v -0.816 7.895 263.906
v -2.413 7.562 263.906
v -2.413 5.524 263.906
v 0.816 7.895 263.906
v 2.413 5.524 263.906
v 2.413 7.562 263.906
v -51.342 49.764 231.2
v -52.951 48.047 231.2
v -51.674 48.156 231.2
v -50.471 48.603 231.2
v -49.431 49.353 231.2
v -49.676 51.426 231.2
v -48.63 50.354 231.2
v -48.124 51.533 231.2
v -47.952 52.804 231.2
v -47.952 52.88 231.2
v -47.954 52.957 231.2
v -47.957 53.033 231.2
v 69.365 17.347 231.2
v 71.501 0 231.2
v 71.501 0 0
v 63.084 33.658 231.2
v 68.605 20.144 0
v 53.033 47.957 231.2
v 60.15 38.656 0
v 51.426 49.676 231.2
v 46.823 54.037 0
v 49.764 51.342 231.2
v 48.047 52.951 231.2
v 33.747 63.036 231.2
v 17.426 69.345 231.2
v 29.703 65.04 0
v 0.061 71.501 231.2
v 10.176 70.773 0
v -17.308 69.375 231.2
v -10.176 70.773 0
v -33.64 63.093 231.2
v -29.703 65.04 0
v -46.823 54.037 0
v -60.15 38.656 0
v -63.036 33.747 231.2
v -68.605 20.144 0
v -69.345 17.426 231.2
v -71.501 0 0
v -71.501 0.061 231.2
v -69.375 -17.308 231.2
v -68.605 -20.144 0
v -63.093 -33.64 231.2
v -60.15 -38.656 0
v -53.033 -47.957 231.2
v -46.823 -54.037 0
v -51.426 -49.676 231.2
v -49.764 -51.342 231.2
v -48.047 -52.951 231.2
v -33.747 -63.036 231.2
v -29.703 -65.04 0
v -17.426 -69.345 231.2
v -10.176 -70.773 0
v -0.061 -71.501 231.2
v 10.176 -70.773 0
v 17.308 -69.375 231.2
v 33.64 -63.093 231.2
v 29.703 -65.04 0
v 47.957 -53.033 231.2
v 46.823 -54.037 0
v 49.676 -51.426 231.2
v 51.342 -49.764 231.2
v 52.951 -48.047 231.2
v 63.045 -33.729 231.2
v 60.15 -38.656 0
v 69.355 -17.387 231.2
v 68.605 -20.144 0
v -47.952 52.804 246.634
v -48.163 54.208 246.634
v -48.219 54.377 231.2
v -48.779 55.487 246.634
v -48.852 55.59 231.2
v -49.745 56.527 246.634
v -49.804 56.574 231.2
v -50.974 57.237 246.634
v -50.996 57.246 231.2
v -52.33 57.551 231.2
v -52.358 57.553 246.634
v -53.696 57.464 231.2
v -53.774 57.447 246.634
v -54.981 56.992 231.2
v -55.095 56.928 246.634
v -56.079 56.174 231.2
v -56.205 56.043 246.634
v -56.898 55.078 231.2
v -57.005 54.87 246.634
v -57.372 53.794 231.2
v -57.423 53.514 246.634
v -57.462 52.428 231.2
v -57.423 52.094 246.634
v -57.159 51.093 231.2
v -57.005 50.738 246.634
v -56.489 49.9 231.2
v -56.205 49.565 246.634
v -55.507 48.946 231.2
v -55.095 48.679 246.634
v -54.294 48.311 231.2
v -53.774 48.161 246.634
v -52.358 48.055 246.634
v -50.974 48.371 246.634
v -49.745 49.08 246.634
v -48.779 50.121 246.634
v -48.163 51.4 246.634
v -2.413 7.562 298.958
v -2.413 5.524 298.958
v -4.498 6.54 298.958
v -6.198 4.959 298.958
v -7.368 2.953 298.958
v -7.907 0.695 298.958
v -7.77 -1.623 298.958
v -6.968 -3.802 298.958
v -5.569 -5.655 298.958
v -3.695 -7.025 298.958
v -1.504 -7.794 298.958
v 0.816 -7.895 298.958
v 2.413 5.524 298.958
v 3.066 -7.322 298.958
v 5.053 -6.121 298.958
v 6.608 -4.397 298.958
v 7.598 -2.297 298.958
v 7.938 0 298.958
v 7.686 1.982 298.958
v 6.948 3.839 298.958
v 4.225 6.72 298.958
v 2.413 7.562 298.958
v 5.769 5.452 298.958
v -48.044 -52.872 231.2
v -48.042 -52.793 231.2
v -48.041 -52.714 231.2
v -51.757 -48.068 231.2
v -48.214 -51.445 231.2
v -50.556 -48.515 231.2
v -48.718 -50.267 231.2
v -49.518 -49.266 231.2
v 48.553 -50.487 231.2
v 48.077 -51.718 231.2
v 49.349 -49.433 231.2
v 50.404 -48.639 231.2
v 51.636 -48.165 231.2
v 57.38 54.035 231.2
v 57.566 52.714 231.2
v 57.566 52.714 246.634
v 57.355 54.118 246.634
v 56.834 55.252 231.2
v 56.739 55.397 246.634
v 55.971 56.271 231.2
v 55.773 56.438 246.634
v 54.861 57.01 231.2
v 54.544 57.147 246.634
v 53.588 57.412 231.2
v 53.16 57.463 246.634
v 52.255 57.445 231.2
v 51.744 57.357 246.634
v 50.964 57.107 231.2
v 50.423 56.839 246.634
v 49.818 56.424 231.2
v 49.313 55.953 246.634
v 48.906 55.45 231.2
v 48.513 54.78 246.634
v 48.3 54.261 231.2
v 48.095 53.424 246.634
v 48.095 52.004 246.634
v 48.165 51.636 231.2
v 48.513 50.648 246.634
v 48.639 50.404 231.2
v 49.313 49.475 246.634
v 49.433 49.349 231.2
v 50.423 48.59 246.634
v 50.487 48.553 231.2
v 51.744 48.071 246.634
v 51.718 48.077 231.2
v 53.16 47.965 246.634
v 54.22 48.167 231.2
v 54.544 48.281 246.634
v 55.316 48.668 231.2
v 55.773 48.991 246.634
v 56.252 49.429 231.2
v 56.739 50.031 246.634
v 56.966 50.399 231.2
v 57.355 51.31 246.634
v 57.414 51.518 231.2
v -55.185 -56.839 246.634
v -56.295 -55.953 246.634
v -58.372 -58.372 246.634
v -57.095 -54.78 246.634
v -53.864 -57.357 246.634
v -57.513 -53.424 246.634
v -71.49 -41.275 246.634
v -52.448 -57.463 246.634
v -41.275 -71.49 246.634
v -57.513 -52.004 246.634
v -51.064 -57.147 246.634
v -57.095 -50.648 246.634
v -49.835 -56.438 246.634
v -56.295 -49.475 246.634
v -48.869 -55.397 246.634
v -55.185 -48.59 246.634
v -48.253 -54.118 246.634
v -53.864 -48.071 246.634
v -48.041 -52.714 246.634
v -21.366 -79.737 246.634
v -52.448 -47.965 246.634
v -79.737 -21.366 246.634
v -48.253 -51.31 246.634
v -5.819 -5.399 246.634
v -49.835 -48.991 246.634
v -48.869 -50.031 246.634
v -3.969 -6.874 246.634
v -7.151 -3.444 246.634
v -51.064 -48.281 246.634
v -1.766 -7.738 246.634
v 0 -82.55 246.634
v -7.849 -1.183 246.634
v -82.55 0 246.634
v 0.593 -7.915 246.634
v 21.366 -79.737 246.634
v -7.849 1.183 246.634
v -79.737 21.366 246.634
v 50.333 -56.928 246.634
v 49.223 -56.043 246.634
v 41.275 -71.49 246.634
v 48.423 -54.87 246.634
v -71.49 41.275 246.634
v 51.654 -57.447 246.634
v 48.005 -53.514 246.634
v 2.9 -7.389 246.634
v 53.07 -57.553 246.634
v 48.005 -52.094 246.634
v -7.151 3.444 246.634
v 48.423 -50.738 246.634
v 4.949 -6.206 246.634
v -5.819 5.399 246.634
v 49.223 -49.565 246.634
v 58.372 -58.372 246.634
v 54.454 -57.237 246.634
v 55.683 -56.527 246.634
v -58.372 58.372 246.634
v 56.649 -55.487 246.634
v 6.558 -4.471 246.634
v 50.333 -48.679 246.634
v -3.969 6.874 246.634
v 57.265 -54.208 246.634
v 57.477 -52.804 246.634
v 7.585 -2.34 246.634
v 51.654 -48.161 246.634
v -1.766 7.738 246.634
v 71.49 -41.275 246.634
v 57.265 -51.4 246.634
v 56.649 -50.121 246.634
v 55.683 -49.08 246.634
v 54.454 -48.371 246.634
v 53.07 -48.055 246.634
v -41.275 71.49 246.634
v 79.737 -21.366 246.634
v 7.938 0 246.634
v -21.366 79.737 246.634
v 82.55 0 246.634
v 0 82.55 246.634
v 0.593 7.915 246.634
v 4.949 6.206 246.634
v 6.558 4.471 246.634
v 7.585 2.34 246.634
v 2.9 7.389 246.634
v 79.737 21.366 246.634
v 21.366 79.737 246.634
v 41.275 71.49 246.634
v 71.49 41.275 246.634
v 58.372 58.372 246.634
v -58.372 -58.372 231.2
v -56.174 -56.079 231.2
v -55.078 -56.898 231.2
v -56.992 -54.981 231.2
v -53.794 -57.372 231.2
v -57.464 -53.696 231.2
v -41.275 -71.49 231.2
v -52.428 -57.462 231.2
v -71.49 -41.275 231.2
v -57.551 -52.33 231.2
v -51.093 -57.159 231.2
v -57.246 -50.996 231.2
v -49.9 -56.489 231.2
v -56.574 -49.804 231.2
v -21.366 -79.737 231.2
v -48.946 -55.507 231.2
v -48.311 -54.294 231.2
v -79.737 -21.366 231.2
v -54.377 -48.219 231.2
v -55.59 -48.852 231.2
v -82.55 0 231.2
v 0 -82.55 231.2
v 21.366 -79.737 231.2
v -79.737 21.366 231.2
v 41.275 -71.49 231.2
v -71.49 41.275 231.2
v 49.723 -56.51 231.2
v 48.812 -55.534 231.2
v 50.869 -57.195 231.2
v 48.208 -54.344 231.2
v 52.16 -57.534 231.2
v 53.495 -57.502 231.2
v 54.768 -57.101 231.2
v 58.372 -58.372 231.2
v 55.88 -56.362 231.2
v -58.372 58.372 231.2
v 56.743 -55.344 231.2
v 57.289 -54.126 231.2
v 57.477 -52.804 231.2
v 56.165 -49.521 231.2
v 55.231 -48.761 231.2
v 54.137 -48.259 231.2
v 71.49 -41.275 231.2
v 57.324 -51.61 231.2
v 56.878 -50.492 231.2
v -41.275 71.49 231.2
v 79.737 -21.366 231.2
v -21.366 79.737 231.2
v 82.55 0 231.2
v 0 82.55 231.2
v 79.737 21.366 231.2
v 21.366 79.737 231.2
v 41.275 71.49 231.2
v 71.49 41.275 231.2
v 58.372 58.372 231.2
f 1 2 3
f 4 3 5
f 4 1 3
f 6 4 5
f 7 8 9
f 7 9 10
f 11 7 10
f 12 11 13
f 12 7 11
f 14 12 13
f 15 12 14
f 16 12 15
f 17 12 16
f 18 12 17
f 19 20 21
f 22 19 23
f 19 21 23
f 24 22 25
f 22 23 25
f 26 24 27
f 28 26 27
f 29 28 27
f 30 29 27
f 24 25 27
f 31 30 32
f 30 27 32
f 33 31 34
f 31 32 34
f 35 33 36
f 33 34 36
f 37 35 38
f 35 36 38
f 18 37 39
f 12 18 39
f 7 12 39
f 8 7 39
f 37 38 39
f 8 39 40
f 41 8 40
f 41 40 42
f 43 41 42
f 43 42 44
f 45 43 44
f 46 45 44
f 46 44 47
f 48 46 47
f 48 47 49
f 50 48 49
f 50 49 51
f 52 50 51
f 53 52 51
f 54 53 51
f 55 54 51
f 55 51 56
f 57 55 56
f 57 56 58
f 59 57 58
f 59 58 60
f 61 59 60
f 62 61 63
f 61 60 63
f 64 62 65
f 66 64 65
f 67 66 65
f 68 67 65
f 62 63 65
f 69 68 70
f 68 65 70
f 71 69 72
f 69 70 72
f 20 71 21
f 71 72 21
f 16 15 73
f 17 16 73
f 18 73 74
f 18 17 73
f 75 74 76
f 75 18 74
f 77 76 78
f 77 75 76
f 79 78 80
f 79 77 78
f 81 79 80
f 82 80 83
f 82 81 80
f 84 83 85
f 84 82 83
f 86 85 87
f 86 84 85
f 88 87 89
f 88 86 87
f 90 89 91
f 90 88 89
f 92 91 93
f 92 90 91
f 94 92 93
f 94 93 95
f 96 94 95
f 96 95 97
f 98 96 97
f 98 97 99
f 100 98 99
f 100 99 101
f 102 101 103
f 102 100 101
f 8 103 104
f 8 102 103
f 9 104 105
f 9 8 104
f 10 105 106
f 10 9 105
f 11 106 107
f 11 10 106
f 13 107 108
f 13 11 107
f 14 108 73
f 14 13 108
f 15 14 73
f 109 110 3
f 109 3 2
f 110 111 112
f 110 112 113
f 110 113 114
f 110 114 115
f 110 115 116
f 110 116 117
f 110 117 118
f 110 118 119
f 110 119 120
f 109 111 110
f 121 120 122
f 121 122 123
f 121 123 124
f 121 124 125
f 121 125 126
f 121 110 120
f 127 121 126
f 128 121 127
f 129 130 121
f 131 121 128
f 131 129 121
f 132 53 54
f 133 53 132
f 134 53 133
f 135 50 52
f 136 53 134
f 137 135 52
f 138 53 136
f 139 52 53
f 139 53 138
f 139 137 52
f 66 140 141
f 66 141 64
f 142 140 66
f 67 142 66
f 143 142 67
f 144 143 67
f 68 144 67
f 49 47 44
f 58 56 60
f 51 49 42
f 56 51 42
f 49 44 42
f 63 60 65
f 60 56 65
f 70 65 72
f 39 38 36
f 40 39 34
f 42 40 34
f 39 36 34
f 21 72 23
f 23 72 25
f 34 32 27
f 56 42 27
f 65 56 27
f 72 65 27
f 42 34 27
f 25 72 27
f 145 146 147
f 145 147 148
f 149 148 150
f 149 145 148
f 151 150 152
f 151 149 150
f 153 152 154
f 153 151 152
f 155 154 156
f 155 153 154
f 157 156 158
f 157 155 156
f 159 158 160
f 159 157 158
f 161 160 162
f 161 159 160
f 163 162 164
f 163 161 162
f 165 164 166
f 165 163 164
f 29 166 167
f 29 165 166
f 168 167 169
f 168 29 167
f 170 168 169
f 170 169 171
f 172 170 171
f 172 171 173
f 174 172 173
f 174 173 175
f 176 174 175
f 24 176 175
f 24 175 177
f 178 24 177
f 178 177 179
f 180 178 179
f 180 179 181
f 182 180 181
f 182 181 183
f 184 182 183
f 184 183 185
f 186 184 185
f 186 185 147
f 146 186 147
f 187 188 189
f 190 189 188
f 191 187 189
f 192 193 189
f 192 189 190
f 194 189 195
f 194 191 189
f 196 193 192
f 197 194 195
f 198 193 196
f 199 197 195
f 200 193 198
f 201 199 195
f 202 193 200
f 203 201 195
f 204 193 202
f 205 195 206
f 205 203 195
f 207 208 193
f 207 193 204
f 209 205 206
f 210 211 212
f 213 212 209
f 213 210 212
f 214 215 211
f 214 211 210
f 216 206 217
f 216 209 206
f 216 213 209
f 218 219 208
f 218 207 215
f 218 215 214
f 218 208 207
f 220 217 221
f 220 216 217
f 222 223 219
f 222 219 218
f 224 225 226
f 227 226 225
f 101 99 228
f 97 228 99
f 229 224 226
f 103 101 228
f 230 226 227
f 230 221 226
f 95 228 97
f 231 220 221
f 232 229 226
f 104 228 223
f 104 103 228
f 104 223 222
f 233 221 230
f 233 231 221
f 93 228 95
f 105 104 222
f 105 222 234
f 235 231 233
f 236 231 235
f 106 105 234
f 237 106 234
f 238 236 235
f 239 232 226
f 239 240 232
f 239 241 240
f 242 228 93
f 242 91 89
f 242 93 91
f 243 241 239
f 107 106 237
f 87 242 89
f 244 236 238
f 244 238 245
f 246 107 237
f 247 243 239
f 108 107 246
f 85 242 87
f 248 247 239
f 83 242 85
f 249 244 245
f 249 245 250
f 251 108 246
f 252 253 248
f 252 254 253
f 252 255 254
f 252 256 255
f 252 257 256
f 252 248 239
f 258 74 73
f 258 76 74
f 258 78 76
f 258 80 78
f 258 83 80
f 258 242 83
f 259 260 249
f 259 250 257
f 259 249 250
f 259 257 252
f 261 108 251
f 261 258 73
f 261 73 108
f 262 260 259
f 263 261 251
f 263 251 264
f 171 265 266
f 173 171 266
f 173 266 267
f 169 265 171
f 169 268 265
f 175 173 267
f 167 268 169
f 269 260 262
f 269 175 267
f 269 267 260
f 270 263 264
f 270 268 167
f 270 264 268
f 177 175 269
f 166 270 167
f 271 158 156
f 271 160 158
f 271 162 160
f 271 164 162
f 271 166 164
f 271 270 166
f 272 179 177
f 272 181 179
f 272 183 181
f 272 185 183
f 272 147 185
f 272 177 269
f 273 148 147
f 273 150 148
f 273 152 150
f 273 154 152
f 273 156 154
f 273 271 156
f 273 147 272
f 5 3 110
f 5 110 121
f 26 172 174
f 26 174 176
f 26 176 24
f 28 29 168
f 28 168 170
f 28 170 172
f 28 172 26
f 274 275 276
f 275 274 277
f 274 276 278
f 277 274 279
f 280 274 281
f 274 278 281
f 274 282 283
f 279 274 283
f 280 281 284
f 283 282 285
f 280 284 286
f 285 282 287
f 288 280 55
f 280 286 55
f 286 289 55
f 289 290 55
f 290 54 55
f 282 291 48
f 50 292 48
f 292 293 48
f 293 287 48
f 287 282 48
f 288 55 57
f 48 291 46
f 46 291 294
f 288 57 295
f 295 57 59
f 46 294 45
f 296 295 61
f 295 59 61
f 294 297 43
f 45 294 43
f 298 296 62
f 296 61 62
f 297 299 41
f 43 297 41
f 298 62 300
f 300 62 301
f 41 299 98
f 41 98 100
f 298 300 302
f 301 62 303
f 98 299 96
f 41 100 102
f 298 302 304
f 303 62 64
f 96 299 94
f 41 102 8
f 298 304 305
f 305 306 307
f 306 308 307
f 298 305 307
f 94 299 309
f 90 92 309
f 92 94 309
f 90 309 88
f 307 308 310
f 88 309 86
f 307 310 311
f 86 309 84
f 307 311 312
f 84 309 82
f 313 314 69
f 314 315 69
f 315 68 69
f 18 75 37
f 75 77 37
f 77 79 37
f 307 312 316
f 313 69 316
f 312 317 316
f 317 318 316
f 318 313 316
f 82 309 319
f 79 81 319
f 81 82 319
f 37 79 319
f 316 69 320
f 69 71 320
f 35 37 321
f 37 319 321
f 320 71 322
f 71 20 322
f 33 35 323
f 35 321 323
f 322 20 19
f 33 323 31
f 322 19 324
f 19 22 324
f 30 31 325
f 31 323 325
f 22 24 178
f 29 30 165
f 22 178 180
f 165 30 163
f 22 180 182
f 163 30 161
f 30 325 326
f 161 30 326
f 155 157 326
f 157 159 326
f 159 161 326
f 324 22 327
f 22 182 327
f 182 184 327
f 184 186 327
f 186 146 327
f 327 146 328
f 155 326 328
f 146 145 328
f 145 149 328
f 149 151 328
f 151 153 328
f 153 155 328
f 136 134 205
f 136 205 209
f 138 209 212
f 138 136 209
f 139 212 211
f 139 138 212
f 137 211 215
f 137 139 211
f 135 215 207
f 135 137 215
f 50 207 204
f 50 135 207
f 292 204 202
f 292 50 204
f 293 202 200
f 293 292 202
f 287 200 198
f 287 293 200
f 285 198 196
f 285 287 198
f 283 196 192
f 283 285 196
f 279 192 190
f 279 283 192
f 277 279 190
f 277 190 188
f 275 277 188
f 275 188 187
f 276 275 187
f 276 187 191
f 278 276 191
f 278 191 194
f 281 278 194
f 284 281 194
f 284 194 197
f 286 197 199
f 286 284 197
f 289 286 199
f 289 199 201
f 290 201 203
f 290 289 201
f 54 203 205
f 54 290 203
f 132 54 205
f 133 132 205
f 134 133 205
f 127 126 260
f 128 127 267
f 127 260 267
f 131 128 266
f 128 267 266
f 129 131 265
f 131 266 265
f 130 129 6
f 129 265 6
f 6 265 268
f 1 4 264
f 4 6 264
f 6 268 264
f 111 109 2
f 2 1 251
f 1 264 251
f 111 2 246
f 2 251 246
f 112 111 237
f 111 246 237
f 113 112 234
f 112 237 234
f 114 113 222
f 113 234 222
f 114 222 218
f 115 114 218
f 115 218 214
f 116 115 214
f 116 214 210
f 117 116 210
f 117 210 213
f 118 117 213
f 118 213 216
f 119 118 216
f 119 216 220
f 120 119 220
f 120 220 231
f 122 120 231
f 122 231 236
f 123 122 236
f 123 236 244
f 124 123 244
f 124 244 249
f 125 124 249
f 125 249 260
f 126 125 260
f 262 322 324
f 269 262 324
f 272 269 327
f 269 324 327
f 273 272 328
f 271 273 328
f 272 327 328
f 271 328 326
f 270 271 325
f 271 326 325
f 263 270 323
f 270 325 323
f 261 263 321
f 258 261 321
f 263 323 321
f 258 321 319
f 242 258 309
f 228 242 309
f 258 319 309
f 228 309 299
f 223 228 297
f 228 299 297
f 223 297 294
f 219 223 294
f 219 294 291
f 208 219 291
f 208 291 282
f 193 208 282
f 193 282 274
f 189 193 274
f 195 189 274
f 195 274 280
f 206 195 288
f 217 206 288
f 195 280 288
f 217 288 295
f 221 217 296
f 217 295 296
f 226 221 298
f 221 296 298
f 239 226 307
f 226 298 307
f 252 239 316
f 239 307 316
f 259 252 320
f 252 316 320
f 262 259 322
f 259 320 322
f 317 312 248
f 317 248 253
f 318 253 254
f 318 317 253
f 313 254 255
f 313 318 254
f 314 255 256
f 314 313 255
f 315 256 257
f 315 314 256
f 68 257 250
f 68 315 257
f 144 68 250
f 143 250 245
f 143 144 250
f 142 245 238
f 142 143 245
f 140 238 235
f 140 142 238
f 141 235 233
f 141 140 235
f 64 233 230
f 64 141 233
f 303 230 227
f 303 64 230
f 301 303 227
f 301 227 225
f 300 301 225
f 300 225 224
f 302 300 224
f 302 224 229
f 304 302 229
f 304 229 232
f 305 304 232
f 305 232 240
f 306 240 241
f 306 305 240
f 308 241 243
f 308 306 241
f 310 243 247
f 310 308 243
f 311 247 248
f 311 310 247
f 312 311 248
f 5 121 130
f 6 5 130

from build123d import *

# Parameters (mm, degrees)
SKETCH2_R           = 71.501
BOSS_EXTRUDE1_DEPTH = 231.199972222
SKETCH3_R           = 82.55
SKETCH3_R_2         = 4.7625
BOSS_EXTRUDE2_DEPTH = 15.434027778
SKETCH4_R           = 7.9375
BOSS_EXTRUDE3_DEPTH = 52.324
SKETCH5_W           = 4.826
SKETCH5_H           = 4.826
CUT_EXTRUDE1_DEPTH  = 35.052


with BuildPart() as part:
    # Sketch2 → Boss-Extrude1 (new body)
    with BuildSketch(Plane.XY):
        Circle(SKETCH2_R)
    extrude(amount=BOSS_EXTRUDE1_DEPTH)

    # Sketch3 → Boss-Extrude2 (add)
    with BuildSketch(Plane.XY.offset(231.199972222)):
        Circle(SKETCH3_R)
        with Locations((-52.714065184, 52.803905992)):
            Circle(SKETCH3_R_2, mode=Mode.SUBTRACT)
        with Locations((52.803905992, 52.714065184)):
            Circle(SKETCH3_R_2, mode=Mode.SUBTRACT)
        with Locations((52.714065184, -52.803905992)):
            Circle(SKETCH3_R_2, mode=Mode.SUBTRACT)
        with Locations((-52.803905992, -52.714065184)):
            Circle(SKETCH3_R_2, mode=Mode.SUBTRACT)
    extrude(amount=BOSS_EXTRUDE2_DEPTH)

    # Sketch4 → Boss-Extrude3 (add)
    with BuildSketch(Plane.XY.offset(246.634)):
        Circle(SKETCH4_R)
    extrude(amount=BOSS_EXTRUDE3_DEPTH)

    # Sketch5 → Cut-Extrude1 (cut)
    with BuildSketch(Plane.XY.offset(298.958)):
        with Locations((0, 7.9375)):
            Rectangle(SKETCH5_W, SKETCH5_H)
    extrude(amount=-CUT_EXTRUDE1_DEPTH, mode=Mode.SUBTRACT)


solid = part.part
